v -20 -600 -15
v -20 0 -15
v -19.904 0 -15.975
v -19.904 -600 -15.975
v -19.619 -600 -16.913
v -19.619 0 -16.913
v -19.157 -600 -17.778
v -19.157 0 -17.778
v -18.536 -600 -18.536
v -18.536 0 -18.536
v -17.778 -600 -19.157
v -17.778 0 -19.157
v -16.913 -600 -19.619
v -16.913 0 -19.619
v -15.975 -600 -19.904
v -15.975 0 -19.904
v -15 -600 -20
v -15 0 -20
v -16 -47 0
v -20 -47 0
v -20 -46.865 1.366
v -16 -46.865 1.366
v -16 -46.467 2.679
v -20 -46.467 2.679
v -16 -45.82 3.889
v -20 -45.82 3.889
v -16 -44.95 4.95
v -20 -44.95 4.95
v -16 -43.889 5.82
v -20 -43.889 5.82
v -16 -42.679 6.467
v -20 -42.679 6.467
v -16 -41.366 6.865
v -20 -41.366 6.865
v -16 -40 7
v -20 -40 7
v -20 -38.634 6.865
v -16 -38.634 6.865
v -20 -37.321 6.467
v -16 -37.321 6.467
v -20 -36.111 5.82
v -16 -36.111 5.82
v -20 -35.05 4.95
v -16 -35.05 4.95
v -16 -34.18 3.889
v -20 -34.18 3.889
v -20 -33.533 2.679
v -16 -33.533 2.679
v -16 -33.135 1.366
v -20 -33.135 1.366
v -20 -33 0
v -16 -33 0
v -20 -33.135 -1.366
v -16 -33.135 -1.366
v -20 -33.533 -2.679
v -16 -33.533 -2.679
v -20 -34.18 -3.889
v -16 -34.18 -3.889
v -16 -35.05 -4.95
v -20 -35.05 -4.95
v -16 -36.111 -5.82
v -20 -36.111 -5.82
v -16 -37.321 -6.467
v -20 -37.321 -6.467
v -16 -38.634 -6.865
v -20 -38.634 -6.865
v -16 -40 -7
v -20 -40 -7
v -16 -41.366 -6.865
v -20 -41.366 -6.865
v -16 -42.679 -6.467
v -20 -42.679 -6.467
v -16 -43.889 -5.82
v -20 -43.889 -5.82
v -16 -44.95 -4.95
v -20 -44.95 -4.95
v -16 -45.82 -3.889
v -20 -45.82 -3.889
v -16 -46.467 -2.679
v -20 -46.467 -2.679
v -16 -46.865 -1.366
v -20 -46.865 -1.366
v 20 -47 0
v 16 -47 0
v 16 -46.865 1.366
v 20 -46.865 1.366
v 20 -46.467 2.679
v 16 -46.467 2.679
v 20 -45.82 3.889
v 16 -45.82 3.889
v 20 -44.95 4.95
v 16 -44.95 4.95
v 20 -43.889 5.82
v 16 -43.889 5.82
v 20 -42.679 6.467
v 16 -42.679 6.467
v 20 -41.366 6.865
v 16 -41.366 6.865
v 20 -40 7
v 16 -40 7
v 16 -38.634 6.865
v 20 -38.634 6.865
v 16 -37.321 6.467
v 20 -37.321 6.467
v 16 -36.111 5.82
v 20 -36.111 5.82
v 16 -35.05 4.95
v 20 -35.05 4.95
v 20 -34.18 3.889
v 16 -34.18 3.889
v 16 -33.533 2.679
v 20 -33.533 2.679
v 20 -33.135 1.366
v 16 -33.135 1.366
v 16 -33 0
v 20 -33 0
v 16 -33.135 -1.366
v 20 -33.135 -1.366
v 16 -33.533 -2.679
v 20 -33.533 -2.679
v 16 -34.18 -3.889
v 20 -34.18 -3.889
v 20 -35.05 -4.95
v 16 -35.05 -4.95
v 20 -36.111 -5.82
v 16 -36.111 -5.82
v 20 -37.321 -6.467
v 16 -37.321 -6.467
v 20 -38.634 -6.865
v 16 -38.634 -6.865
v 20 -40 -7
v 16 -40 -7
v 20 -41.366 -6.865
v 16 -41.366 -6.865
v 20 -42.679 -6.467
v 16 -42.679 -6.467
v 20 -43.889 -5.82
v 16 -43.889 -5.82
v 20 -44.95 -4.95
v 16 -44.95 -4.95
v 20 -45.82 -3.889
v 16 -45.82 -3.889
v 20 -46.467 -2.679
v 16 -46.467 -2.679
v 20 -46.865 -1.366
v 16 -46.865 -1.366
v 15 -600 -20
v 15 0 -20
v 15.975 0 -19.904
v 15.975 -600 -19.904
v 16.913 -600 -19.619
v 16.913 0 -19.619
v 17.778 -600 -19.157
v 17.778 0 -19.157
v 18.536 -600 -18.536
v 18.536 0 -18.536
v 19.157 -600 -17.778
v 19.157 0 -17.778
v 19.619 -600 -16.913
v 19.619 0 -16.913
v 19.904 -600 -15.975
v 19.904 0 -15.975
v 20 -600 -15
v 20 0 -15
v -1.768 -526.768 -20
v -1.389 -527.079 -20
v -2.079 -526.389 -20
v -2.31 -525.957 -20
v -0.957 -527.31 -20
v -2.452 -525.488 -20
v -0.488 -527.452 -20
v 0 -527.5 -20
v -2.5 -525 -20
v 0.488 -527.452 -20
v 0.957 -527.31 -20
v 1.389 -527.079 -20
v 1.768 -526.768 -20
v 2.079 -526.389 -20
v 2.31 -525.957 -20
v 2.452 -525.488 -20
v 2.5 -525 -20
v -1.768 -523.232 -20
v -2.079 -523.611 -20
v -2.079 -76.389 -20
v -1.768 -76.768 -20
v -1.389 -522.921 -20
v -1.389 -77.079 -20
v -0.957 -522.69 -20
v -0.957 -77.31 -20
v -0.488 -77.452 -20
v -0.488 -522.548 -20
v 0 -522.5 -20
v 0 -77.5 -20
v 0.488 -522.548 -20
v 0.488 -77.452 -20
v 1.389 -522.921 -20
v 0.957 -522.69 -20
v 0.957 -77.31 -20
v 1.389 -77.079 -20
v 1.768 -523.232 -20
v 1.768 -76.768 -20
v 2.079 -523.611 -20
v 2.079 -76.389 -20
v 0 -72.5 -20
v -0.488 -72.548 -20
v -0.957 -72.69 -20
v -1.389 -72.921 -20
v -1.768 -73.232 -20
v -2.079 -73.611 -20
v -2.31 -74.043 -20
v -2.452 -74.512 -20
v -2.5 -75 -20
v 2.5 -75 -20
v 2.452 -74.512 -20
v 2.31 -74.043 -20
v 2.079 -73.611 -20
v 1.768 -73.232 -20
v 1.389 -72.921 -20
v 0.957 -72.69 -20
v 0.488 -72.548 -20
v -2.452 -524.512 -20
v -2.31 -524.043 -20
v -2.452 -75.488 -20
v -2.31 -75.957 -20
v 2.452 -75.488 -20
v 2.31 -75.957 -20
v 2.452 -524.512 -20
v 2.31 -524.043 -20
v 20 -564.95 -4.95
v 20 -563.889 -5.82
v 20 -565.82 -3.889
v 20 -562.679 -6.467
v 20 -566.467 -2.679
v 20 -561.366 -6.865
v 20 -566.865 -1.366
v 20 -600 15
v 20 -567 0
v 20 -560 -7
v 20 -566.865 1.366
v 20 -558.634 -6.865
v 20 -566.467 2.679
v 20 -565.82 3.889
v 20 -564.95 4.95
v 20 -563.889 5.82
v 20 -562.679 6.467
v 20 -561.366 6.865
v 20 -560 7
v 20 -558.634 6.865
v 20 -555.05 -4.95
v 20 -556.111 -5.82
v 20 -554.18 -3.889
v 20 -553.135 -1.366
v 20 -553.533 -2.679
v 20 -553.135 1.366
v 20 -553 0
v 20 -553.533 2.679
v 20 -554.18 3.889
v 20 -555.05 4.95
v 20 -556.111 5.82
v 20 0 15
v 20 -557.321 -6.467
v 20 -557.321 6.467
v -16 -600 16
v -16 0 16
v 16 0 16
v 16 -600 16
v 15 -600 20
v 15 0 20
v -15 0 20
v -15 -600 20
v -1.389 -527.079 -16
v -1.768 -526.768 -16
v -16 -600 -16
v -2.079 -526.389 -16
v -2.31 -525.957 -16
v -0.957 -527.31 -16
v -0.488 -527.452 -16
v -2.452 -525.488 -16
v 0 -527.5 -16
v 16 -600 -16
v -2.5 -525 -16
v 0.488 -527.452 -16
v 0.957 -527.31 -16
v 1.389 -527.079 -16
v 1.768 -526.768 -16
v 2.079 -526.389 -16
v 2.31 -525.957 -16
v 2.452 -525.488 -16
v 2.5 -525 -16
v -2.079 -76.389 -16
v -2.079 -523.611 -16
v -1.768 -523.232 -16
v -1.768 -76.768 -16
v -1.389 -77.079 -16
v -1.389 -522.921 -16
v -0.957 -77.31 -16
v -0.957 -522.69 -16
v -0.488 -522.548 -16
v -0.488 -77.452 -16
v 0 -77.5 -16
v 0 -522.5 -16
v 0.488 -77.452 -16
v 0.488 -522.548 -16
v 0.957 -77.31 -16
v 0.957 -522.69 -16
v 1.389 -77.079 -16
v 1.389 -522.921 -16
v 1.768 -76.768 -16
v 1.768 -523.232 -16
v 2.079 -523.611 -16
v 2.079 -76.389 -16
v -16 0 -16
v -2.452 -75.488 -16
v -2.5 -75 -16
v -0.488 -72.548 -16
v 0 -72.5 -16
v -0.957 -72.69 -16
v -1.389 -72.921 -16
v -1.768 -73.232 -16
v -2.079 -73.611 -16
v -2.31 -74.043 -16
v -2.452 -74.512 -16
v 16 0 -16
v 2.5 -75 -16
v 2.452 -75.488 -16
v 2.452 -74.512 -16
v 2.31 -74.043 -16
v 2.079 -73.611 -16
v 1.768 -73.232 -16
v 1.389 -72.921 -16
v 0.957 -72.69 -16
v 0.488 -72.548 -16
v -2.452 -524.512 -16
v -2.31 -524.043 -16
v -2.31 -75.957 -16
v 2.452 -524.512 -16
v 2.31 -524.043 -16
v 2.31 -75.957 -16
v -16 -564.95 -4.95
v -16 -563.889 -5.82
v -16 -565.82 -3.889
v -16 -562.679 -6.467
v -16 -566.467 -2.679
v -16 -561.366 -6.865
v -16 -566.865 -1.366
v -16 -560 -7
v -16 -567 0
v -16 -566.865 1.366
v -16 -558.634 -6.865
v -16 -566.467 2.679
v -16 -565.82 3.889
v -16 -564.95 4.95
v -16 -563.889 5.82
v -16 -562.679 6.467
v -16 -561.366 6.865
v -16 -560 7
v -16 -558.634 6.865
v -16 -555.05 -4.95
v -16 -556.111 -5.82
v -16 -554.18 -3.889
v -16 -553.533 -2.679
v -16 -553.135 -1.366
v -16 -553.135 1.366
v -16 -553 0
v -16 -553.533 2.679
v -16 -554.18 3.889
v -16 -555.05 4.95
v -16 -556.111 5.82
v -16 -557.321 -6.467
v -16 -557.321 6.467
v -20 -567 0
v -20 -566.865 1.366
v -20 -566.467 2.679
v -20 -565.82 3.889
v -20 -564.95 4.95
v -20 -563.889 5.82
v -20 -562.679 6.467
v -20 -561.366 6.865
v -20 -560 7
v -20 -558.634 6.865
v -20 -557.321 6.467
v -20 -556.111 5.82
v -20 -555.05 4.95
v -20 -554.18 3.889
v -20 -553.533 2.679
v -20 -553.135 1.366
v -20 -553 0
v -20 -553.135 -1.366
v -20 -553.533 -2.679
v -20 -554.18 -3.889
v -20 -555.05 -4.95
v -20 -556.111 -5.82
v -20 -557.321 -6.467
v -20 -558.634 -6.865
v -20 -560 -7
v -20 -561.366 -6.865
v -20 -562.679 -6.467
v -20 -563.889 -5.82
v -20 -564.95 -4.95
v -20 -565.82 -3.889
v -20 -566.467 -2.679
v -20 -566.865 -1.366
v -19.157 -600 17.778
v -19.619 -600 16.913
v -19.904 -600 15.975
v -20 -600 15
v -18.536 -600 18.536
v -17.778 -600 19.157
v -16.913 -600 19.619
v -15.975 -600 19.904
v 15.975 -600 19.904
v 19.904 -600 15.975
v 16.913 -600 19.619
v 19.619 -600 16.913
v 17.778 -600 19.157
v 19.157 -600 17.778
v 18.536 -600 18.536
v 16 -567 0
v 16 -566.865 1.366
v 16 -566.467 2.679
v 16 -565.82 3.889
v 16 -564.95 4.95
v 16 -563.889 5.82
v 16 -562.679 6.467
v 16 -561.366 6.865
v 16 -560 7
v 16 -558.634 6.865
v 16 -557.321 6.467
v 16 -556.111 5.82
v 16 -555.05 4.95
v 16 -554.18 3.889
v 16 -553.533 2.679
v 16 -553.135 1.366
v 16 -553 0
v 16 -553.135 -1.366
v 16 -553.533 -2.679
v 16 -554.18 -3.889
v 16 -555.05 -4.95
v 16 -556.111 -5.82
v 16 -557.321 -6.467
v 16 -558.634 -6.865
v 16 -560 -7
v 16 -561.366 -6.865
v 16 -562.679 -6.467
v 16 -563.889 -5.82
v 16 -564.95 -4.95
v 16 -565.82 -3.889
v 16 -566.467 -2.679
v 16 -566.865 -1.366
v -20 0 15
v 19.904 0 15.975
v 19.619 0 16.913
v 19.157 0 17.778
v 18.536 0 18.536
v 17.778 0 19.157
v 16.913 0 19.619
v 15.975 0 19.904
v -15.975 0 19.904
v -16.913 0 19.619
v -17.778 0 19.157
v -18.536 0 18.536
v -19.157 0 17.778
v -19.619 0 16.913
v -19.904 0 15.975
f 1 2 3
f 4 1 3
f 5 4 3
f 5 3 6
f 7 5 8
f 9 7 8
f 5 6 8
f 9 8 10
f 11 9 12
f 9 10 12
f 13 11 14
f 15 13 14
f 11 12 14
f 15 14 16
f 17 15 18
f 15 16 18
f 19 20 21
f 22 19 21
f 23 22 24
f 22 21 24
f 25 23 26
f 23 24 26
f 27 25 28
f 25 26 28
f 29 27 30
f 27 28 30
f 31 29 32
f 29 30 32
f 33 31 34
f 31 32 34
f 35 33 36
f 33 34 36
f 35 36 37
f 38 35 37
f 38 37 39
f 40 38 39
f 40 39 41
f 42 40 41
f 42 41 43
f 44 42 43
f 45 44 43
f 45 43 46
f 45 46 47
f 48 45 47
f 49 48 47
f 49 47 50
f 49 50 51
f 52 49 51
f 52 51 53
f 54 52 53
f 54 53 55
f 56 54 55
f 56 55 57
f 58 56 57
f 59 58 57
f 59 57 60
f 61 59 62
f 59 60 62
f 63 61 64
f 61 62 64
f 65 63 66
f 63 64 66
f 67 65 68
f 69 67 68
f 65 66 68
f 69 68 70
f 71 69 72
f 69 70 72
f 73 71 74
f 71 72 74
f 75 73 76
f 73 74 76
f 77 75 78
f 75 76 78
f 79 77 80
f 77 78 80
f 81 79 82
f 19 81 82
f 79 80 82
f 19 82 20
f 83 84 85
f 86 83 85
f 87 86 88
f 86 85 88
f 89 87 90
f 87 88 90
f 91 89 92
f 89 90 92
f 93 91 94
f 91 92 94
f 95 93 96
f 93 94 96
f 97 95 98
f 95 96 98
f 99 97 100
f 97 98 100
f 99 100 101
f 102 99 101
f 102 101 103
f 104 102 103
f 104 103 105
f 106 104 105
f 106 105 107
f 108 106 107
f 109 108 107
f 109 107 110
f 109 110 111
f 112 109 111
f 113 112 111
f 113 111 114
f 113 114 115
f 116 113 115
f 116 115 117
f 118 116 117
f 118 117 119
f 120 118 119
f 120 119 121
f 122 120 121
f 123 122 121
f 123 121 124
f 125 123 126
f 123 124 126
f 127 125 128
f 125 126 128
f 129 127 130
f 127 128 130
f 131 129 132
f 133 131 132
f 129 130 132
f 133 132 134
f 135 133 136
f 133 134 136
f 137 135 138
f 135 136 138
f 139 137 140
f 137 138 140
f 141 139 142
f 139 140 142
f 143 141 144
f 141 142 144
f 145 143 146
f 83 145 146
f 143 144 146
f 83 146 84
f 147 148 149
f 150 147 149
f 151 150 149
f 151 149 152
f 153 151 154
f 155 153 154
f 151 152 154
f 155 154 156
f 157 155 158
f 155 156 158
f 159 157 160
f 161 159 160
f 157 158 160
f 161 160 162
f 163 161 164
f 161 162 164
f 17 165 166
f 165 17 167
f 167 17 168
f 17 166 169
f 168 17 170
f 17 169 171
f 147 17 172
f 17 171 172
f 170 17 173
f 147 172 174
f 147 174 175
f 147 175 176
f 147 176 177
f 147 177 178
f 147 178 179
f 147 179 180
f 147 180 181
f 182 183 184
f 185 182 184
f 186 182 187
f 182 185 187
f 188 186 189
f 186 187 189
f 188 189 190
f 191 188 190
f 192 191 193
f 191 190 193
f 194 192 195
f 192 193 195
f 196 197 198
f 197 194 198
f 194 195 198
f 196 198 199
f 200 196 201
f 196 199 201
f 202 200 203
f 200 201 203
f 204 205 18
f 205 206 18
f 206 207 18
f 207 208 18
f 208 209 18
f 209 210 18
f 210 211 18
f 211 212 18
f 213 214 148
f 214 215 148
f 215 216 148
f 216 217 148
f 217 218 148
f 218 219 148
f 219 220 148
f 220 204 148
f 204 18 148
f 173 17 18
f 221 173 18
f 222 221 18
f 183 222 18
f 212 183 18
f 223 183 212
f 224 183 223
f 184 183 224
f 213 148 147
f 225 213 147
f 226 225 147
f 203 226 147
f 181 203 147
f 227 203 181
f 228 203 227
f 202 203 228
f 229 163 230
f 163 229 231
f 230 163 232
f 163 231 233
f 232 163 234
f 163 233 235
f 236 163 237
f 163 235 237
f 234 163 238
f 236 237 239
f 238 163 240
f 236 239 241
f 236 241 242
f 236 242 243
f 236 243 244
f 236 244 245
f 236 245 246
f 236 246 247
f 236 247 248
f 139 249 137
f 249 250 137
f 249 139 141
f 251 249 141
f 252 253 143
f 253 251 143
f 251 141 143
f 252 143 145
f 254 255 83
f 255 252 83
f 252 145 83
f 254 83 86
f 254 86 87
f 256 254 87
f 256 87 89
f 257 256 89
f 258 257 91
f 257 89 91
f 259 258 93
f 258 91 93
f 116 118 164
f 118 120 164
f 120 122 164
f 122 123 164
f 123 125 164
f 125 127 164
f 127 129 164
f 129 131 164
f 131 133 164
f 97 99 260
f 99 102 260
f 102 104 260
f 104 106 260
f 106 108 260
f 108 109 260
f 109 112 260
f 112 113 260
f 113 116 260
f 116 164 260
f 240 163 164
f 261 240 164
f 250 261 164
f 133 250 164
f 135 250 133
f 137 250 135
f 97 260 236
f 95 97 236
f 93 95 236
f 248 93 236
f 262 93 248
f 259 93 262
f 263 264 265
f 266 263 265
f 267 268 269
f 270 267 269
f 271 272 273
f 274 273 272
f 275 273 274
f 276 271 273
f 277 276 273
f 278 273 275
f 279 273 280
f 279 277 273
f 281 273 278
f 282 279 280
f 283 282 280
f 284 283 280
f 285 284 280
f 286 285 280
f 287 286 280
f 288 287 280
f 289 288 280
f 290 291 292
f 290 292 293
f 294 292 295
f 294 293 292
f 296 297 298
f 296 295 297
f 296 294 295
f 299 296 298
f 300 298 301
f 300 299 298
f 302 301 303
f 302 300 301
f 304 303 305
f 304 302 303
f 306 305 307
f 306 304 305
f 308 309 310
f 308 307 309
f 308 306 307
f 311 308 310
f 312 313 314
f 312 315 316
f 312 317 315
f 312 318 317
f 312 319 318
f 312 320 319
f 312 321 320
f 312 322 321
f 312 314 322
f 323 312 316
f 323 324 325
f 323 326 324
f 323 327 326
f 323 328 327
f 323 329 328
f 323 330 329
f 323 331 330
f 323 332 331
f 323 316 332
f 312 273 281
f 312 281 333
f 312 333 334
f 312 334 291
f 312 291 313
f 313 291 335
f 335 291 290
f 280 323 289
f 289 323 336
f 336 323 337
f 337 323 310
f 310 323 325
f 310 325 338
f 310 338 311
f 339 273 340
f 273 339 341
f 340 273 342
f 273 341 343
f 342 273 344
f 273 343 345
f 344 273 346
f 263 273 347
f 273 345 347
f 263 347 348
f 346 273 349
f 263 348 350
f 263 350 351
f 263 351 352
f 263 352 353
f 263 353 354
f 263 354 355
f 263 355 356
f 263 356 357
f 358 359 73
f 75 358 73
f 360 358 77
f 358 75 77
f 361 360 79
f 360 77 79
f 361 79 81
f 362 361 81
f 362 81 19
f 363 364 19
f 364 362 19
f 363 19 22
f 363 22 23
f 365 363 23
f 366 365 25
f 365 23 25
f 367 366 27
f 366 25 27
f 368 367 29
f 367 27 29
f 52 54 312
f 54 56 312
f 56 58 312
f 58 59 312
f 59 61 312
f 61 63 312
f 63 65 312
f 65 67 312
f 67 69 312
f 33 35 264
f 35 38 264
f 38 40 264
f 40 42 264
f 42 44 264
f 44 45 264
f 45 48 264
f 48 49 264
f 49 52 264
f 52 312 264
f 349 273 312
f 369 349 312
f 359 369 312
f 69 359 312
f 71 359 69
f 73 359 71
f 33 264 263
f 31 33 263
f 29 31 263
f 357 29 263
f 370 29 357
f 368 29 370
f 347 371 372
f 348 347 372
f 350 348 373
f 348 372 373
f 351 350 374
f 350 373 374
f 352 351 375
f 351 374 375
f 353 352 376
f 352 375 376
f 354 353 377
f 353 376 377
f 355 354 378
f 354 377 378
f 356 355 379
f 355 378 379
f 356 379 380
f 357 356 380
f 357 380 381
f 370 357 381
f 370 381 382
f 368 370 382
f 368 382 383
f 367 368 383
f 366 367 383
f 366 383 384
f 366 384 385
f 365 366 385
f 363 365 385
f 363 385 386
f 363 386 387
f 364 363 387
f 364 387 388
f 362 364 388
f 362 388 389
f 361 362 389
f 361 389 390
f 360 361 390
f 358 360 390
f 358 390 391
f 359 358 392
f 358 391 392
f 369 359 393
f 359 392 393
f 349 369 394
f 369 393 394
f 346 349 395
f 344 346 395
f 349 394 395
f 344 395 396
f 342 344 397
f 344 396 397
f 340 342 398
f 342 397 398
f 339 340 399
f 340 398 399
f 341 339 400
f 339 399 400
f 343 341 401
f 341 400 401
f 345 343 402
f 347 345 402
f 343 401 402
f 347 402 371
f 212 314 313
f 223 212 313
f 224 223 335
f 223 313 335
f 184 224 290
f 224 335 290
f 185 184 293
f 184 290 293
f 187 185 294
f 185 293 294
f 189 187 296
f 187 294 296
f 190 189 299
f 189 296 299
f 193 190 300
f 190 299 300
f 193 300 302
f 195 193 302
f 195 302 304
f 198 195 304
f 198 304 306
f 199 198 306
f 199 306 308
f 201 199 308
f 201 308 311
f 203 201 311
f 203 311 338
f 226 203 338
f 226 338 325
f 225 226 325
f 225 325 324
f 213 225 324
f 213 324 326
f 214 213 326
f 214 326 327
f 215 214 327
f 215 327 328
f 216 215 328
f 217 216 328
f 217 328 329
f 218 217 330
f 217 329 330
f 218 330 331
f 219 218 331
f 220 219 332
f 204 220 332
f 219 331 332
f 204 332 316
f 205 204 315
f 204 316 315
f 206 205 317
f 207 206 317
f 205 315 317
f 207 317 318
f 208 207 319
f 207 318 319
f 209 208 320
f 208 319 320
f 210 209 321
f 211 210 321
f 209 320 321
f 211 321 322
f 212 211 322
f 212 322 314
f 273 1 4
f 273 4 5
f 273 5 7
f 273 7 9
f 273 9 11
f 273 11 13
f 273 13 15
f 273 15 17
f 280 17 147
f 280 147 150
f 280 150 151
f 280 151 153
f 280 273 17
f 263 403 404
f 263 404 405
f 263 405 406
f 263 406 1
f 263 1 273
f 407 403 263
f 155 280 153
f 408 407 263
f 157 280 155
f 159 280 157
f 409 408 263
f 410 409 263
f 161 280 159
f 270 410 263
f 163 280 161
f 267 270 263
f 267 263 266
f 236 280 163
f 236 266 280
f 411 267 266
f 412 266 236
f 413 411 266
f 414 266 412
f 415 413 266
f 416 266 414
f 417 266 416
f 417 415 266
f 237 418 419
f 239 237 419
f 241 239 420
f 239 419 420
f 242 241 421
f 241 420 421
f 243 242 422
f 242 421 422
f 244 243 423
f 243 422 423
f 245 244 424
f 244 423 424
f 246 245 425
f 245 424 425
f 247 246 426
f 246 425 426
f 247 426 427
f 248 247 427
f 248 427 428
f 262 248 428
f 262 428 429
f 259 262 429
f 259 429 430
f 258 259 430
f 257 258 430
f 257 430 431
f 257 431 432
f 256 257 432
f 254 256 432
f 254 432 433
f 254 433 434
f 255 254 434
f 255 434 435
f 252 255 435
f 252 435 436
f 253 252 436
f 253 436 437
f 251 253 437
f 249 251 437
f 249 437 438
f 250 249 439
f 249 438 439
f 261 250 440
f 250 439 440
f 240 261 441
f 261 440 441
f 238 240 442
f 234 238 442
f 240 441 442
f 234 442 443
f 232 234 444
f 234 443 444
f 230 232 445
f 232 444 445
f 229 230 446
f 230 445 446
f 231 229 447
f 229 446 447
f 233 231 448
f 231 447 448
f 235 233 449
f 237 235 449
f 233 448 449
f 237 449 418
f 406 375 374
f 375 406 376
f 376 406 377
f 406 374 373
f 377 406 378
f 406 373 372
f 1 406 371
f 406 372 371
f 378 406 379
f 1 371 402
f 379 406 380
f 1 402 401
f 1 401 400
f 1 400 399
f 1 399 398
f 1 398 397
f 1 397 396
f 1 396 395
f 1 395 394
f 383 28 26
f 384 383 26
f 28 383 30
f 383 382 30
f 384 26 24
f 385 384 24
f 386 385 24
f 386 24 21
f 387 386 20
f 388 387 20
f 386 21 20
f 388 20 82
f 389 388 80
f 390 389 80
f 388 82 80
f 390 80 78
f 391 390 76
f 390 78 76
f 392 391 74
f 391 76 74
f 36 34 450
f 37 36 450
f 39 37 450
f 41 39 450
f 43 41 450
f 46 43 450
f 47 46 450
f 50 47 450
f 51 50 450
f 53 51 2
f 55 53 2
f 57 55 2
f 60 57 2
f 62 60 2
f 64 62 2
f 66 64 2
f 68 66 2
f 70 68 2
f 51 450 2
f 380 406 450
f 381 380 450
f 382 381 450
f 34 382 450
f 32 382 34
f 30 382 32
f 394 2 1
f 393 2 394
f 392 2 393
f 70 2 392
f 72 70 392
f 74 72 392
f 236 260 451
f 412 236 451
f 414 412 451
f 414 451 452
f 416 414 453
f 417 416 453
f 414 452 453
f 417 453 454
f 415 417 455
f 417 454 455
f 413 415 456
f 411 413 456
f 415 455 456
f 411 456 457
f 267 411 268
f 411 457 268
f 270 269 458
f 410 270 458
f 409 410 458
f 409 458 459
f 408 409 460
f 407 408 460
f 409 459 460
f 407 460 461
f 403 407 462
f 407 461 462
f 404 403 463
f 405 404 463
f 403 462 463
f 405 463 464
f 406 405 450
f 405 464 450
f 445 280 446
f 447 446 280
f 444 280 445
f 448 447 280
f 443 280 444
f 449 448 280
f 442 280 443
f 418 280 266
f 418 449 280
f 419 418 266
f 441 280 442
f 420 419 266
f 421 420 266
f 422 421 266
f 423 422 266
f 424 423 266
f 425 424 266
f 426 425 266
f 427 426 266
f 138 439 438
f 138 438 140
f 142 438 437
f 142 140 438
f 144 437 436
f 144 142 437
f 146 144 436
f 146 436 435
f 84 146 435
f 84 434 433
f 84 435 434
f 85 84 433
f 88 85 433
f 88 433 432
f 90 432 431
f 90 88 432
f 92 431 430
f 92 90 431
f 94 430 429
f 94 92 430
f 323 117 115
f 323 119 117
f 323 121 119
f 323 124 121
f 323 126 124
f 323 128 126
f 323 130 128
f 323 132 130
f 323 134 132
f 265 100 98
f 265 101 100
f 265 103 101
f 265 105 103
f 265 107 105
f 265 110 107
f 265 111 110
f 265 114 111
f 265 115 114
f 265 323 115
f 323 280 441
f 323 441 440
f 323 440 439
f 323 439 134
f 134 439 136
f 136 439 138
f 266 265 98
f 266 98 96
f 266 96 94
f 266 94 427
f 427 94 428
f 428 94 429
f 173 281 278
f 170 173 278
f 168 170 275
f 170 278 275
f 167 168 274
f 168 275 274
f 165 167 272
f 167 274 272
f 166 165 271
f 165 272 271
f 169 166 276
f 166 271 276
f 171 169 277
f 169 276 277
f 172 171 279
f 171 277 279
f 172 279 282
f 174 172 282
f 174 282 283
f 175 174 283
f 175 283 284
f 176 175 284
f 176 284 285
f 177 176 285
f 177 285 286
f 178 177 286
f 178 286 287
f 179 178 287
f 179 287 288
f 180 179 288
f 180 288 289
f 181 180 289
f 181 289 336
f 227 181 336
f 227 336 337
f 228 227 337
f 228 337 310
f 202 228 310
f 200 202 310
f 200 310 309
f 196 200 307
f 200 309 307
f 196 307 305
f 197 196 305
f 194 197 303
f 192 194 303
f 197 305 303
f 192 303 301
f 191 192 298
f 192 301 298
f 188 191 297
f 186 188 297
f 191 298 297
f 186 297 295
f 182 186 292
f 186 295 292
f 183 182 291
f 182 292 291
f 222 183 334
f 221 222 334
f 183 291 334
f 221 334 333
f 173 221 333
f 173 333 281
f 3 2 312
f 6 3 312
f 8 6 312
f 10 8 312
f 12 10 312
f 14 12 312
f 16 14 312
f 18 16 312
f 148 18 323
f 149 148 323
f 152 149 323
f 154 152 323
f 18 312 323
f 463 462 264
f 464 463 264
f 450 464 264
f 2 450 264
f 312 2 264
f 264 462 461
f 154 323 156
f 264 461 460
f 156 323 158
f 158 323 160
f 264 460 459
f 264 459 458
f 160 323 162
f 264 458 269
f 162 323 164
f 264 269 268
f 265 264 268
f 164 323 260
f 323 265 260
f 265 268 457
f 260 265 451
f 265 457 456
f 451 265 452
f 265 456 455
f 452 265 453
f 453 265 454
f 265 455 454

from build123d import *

# Parameters (mm, degrees)
F0_W     = 32
F0_H     = 32
F1_DEPTH = 600
F3_D     = 14
F3_DEPTH = 45
F4_D     = 14
F4_DEPTH = 45
F6_D     = 5
F6_DEPTH = 5
F7_D     = 5
F7_DEPTH = 5


with BuildPart() as f1:
    # F0 (on Front) → F1 (new body)
    with BuildSketch(Plane.XZ):
        with BuildLine():
            Line((-15, -20), (15, -20))
            ThreePointArc((15, -20), (18.535534, -18.535534), (20, -15))
            Line((20, -15), (20, 15))
            ThreePointArc((20, 15), (18.535534, 18.535534), (15, 20))
            Line((15, 20), (-15, 20))
            ThreePointArc((-15, 20), (-18.535534, 18.535534), (-20, 15))
            Line((-20, 15), (-20, -15))
            ThreePointArc((-20, -15), (-18.535534, -18.535534), (-15, -20))
        make_face()
        Rectangle(F0_W, F0_H, mode=Mode.SUBTRACT)
    extrude(amount=F1_DEPTH)

    # F3
    with Locations(Plane.YZ.offset(20)):
        with Locations((-560, 0)):
            Hole(F3_D / 2, depth=F3_DEPTH)

    # F4
    with Locations(Plane.YZ.offset(20)):
        with Locations((-40, 0)):
            Hole(F4_D / 2, depth=F4_DEPTH)

    # F6
    with Locations(Plane(origin=(0, 0, -20), x_dir=(1, 0, 0), z_dir=(0, 0, -1))):
        with Locations((0, 525)):
            Hole(F6_D / 2, depth=F6_DEPTH)

    # F7
    with Locations(Plane(origin=(0, 0, -20), x_dir=(1, 0, 0), z_dir=(0, 0, -1))):
        with Locations((0, 75)):
            Hole(F7_D / 2, depth=F7_DEPTH)


solid = f1.part
